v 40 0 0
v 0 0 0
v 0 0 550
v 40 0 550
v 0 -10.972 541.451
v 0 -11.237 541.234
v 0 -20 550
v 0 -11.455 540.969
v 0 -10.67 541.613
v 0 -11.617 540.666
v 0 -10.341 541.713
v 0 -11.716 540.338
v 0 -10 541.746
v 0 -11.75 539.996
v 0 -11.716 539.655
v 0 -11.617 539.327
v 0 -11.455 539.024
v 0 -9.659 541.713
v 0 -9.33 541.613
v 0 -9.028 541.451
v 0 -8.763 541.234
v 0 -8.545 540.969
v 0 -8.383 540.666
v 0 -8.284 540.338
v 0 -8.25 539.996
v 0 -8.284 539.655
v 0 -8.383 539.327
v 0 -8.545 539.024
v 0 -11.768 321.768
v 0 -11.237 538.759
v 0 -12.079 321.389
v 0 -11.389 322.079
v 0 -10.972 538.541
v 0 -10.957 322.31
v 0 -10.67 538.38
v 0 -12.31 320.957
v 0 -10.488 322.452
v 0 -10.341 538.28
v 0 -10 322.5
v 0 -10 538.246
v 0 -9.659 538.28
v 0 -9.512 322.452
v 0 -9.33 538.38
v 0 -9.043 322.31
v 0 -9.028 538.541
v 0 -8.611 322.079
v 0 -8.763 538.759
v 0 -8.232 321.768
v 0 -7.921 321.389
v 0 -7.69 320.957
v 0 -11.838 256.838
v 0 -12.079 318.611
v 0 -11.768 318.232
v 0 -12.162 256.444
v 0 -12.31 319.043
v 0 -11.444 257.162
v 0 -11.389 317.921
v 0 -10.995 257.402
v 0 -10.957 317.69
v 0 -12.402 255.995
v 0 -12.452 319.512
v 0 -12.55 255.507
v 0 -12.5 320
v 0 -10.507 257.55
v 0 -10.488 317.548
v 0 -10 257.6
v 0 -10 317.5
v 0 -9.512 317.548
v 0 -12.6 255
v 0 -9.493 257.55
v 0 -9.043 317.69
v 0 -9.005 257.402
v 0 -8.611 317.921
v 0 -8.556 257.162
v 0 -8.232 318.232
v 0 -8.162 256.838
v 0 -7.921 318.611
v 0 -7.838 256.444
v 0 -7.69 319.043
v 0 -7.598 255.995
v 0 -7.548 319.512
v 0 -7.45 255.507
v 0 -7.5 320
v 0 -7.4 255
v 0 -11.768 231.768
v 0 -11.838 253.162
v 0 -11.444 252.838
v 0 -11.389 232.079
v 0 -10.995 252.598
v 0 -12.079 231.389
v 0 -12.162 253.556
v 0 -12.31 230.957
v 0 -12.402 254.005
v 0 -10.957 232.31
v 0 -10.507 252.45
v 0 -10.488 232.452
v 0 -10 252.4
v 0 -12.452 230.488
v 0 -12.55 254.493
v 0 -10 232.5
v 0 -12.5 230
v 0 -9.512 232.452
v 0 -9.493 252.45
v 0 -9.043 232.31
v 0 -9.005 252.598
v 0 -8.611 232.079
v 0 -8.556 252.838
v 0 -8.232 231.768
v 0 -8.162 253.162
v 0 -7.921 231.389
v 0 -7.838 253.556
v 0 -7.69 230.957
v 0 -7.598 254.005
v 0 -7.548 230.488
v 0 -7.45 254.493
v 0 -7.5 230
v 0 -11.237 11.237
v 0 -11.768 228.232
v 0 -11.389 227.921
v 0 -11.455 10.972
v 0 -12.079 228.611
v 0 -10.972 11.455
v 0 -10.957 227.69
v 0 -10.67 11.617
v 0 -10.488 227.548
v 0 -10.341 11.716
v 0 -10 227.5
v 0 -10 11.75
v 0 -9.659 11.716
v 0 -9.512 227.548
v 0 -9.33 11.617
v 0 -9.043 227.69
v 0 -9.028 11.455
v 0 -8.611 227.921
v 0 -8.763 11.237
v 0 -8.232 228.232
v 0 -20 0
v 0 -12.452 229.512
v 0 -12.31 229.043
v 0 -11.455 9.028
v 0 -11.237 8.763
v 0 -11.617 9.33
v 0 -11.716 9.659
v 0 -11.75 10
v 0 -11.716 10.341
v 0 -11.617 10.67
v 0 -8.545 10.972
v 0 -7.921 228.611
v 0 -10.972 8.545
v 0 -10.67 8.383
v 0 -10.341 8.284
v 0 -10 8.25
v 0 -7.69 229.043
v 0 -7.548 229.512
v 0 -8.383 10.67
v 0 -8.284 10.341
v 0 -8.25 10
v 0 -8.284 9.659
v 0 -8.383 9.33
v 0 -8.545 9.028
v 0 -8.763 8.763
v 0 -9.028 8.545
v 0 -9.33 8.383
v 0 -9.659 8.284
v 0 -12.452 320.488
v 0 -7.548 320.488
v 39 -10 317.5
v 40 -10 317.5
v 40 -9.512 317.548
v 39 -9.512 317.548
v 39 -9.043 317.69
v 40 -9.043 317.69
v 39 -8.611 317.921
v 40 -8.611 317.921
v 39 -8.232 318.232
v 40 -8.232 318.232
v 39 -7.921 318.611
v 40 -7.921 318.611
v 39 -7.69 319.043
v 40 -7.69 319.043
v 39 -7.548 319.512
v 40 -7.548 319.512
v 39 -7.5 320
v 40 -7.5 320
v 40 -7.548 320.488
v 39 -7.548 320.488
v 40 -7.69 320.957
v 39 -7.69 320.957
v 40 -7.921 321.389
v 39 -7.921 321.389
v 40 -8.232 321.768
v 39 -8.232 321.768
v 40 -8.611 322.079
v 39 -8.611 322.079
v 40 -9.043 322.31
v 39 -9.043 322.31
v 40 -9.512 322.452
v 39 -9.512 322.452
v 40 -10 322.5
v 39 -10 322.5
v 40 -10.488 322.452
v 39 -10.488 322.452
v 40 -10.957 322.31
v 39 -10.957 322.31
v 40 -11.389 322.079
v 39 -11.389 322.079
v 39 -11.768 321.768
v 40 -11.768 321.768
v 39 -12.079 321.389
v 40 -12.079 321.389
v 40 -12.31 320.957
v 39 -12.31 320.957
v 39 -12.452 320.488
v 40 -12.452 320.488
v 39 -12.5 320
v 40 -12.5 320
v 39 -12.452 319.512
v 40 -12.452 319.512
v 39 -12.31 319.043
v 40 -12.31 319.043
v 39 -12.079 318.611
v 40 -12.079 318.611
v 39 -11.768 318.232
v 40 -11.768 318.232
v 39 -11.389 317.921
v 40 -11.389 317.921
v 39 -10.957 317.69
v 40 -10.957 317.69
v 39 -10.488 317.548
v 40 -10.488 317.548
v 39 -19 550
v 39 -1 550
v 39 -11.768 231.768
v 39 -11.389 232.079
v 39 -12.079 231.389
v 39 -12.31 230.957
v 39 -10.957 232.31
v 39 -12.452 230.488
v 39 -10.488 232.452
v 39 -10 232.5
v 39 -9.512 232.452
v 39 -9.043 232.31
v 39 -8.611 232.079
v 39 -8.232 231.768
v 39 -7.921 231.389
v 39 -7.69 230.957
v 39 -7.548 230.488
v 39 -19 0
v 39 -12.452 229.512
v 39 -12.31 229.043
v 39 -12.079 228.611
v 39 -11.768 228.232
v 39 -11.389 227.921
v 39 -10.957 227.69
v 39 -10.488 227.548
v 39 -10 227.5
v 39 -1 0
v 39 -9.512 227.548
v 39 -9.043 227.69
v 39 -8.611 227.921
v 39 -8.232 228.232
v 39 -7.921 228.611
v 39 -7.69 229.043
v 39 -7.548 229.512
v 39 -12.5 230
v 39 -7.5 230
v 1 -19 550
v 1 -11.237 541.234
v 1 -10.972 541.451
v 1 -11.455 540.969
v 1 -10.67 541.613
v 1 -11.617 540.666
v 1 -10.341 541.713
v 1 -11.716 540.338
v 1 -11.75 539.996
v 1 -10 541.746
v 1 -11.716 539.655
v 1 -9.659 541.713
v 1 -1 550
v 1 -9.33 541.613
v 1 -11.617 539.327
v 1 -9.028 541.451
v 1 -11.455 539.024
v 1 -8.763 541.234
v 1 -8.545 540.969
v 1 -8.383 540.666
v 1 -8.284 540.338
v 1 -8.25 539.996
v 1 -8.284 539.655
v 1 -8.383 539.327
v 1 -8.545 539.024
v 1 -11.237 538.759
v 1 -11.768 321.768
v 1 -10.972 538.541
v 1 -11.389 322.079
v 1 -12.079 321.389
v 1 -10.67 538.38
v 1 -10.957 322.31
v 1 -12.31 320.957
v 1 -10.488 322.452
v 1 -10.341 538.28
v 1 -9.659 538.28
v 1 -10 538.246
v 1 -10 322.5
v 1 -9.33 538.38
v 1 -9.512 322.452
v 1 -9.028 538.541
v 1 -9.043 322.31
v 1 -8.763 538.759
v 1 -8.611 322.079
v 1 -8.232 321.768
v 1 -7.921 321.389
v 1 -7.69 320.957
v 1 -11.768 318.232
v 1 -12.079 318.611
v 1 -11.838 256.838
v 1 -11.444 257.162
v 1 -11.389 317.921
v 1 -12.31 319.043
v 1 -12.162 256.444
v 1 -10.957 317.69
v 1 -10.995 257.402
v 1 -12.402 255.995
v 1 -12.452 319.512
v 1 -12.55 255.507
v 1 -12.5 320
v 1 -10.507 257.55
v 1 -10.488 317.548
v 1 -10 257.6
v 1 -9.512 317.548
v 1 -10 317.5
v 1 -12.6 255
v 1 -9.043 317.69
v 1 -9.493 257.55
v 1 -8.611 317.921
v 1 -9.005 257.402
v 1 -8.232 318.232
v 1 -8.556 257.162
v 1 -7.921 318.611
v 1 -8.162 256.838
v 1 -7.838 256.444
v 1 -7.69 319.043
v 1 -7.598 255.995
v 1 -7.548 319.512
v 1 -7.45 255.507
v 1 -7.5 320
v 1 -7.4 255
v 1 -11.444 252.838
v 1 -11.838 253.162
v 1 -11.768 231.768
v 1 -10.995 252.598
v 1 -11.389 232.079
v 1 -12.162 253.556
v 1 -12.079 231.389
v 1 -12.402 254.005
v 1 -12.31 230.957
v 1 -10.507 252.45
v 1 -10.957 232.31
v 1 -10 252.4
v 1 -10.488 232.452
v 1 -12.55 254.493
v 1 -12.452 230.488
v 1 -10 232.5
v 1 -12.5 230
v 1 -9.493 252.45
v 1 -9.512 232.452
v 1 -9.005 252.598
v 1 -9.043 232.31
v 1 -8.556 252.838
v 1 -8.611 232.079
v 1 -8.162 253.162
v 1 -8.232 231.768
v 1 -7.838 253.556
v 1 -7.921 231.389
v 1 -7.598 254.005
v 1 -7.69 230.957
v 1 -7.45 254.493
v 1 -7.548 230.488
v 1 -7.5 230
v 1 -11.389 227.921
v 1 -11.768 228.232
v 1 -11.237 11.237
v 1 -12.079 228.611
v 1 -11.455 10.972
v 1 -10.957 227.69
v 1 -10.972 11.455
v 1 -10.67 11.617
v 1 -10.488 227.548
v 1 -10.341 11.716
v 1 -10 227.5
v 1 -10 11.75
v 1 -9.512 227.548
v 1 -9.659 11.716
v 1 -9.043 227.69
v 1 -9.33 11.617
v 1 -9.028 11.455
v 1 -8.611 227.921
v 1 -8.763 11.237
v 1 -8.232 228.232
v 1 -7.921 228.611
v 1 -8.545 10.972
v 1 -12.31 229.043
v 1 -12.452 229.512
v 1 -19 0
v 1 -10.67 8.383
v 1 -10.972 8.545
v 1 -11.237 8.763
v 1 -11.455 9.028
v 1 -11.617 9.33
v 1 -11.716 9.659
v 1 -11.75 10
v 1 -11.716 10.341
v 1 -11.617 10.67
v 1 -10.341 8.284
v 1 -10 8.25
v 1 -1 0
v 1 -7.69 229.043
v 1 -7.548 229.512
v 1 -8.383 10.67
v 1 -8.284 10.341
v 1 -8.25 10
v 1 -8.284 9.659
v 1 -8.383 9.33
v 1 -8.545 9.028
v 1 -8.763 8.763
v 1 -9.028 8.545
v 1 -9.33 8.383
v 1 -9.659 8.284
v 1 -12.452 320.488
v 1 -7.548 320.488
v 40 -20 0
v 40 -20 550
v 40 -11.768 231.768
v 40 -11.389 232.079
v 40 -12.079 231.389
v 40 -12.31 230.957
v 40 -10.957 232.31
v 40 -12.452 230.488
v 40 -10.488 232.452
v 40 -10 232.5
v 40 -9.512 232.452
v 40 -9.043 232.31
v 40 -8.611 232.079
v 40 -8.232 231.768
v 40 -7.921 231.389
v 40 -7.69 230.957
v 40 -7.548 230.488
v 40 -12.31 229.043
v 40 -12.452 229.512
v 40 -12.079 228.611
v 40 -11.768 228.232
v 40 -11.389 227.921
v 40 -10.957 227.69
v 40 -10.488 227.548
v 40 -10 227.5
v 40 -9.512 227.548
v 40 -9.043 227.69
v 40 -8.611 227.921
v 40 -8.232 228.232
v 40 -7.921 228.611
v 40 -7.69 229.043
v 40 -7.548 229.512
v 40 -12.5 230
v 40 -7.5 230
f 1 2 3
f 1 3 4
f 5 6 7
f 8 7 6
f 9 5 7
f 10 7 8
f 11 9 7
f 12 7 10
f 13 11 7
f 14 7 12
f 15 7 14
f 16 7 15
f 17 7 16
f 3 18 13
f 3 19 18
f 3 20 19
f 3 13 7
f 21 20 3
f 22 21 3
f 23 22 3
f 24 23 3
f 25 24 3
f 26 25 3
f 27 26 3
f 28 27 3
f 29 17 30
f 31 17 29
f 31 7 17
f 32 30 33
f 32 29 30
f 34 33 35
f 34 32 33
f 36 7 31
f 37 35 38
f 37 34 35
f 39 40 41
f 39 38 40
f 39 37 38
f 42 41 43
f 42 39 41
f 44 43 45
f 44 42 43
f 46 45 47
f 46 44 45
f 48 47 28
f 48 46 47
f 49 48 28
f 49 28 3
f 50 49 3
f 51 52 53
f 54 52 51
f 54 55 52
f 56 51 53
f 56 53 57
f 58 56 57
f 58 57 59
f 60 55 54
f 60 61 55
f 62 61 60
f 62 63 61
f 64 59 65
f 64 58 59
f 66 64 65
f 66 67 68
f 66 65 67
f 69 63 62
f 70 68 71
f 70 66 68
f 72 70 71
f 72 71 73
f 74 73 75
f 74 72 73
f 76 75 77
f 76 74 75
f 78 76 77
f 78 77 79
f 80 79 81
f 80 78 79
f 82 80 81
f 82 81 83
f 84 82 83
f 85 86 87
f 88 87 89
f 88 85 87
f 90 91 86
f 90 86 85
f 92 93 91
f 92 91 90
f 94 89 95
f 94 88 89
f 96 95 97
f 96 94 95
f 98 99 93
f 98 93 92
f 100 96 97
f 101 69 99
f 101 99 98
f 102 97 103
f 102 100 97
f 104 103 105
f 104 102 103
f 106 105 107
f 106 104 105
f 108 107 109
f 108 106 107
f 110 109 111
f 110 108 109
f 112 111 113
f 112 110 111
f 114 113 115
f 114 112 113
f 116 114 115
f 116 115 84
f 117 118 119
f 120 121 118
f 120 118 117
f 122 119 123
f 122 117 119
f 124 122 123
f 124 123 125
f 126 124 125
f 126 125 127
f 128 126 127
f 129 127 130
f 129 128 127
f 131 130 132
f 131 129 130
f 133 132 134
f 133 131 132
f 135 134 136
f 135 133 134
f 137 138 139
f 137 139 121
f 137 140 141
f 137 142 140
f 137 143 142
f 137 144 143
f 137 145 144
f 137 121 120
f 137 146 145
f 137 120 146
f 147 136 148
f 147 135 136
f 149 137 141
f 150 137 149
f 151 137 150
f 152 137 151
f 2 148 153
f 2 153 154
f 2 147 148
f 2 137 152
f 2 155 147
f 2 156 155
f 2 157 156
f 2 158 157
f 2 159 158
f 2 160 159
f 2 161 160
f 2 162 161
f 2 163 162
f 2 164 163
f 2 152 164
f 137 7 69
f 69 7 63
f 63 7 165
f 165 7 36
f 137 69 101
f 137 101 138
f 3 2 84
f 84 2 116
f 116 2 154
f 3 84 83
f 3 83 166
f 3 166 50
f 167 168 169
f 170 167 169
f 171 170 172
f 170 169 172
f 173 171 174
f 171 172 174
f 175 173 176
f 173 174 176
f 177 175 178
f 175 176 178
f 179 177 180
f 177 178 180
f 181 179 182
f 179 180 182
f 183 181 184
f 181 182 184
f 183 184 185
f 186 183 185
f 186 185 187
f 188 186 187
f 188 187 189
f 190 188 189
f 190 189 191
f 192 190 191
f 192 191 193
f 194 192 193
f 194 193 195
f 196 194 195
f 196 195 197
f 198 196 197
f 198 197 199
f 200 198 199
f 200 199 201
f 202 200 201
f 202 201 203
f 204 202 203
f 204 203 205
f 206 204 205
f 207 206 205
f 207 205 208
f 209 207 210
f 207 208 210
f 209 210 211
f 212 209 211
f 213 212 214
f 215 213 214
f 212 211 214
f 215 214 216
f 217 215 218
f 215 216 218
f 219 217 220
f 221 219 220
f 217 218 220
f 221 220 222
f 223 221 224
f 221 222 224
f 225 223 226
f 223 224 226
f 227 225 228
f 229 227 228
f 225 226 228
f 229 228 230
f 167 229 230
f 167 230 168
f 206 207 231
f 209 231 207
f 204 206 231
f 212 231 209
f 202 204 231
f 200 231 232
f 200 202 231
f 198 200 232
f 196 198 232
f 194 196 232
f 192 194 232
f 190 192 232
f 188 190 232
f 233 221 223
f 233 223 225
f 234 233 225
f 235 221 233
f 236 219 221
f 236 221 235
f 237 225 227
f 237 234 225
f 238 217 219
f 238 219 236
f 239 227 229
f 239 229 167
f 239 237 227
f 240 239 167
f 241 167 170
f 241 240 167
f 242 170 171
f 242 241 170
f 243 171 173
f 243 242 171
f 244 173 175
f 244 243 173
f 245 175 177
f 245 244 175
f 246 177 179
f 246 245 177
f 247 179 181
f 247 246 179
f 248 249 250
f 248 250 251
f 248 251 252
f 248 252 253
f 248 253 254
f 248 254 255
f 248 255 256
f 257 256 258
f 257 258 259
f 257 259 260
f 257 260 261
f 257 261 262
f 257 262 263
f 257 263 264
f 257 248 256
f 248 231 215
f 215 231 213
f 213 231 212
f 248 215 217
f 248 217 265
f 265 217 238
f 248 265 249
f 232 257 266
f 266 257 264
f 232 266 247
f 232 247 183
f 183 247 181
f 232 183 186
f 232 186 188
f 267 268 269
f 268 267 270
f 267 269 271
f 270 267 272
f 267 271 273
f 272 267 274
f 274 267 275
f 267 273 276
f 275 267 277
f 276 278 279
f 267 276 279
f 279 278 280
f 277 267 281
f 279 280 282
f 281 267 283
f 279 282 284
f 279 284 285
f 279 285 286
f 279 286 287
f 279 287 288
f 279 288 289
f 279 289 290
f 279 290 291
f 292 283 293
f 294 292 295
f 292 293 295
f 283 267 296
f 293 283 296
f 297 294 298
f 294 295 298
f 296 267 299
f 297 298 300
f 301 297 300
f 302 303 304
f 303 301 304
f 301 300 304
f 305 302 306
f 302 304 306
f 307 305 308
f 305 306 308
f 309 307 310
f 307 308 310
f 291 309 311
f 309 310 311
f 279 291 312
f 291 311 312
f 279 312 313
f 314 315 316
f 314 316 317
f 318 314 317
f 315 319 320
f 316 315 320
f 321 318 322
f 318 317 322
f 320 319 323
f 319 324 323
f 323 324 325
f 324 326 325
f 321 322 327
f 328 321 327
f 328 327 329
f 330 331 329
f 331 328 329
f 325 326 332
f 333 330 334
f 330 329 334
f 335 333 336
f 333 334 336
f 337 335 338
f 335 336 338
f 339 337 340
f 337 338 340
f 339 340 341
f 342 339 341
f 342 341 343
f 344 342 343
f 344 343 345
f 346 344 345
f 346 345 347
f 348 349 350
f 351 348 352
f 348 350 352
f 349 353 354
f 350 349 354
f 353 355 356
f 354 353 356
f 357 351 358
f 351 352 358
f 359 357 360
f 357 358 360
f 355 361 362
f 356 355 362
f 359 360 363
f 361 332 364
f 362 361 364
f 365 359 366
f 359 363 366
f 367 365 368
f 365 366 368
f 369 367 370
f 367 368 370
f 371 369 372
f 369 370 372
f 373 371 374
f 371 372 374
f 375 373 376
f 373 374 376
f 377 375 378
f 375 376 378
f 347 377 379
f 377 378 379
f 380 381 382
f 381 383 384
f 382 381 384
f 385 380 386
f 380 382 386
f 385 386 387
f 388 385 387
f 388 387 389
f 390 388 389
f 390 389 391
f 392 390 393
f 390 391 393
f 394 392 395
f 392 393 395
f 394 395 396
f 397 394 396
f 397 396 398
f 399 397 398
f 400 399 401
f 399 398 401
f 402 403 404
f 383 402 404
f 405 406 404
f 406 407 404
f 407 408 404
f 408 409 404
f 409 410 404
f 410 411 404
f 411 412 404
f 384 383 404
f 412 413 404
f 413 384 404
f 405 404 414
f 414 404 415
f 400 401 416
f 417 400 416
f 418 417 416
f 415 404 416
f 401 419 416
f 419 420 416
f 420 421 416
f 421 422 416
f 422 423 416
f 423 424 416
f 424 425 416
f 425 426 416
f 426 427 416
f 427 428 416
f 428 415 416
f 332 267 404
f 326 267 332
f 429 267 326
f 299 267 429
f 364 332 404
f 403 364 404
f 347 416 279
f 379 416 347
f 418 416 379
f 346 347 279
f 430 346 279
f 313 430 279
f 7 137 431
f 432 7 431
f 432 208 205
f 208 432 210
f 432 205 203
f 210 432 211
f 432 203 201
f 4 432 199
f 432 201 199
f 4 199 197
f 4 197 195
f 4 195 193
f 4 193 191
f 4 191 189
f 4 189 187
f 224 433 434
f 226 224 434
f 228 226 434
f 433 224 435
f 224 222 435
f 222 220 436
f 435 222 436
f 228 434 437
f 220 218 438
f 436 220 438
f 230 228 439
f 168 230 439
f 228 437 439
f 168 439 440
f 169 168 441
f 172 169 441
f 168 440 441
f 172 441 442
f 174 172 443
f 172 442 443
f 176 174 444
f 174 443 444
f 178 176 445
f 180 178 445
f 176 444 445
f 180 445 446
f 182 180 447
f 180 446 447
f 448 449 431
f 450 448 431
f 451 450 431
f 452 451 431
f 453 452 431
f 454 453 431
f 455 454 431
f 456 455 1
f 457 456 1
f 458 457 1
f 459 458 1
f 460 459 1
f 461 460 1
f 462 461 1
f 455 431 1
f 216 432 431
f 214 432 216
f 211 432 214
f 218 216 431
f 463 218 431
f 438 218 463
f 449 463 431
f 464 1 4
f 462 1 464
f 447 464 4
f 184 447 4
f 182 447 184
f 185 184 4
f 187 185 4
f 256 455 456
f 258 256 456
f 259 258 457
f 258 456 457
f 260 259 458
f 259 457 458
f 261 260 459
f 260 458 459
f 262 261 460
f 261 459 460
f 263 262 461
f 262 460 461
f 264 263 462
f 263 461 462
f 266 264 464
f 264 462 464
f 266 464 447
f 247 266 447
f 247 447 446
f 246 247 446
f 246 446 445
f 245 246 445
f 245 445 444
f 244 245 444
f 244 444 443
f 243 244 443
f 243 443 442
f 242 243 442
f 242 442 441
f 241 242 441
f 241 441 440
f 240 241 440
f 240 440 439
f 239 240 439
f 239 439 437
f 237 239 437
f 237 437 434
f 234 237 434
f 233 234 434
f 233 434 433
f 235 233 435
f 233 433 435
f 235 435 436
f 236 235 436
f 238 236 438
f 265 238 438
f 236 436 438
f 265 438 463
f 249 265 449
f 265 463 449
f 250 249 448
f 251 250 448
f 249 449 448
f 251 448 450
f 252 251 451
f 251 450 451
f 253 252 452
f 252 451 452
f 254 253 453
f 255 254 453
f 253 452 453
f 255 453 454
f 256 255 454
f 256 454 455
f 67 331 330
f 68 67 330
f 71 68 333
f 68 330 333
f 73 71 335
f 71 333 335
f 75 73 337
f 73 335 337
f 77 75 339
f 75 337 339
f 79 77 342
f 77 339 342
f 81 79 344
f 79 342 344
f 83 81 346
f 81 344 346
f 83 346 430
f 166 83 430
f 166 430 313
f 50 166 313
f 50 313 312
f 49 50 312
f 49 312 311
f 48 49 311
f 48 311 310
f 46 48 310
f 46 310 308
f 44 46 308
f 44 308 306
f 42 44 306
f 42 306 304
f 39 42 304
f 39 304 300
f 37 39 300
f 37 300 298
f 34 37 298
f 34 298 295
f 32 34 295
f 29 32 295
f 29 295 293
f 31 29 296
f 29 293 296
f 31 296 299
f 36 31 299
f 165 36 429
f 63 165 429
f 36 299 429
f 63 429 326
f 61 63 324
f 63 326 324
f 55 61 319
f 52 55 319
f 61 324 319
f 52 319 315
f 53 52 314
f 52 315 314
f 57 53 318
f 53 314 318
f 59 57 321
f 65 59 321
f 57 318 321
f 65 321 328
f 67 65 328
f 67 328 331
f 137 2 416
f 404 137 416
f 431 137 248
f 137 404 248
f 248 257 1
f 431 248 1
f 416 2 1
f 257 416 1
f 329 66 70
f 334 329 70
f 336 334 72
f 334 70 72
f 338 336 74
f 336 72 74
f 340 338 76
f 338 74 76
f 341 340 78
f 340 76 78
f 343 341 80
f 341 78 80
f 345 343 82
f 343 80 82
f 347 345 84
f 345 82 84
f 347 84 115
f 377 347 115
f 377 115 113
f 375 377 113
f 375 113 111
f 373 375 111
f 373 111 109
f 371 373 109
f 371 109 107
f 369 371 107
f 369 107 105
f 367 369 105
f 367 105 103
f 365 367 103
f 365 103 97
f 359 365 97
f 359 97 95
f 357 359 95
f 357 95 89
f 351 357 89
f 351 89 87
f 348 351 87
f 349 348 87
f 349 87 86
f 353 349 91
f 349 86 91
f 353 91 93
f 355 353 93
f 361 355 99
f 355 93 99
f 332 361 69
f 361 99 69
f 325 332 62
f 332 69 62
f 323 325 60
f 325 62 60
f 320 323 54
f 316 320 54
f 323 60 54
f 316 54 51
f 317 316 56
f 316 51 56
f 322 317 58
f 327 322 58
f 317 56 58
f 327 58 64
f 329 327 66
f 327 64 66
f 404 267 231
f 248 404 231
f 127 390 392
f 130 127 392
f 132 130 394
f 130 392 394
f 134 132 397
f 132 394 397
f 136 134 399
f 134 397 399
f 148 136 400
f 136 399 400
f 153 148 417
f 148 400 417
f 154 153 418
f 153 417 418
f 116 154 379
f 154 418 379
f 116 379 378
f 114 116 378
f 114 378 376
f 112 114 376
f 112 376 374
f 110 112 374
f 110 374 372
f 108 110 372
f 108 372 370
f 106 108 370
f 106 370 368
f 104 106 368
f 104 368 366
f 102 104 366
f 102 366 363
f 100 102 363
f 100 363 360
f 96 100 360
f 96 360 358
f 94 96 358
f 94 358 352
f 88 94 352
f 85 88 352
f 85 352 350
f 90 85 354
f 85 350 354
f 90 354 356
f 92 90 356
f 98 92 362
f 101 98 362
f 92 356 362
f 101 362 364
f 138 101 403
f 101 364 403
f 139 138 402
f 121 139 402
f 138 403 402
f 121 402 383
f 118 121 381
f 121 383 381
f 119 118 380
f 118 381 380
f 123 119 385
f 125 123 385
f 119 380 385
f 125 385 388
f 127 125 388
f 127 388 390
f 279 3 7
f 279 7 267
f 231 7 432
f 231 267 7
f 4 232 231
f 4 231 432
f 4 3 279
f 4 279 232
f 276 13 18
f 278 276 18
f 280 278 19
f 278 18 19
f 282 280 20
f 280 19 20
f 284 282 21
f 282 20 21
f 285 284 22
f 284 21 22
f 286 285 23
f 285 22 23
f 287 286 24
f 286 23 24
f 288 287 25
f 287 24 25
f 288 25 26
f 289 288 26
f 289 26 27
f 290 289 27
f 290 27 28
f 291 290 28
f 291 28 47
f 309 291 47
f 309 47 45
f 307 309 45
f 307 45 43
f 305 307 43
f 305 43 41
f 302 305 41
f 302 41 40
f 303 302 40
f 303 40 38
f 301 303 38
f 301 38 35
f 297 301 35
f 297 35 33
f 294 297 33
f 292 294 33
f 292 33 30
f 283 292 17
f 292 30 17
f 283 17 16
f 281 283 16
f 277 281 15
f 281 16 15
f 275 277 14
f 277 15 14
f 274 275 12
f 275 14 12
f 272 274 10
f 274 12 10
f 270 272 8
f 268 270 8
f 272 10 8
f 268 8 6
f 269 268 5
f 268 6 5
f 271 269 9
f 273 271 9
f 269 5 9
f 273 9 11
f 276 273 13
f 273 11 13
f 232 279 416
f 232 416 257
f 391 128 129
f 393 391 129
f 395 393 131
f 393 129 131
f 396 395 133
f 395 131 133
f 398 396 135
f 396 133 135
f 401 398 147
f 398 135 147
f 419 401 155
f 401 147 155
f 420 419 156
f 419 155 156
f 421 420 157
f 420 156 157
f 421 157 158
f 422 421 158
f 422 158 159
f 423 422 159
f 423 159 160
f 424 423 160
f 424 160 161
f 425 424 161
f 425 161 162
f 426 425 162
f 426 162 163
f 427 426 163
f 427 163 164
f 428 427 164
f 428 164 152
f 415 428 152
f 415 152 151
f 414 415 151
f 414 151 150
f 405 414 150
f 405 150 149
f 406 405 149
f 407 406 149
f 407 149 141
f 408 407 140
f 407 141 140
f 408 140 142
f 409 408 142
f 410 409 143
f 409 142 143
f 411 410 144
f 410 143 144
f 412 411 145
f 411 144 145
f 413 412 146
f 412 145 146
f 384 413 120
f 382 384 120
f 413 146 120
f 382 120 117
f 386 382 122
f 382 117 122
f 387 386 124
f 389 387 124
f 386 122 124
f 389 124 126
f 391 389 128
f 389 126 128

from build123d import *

# Parameters (mm, degrees)
SKETCH_1_W          = 40
SKETCH_1_H          = 20
SKETCH_1_W_2        = 38
SKETCH_1_H_2        = 18
EXTRUDE_1_DEPTH     = 550
SKETCH_4_R          = 1.75
CUT_EXTRUDE_2_DEPTH = 1.5
SKETCH_5_R          = 2.6
CUT_EXTRUDE_3_DEPTH = 1.5
SKETCH_6_R          = 2.5
CUT_EXTRUDE_4_DEPTH = 552.815186453


with BuildPart() as part:
    # 草图1 → 拉伸-薄壁1 (new body)
    with BuildSketch(Plane.XY):
        with Locations((20, -10)):
            Rectangle(SKETCH_1_W, SKETCH_1_H)
        with Locations((20, -10)):
            Rectangle(SKETCH_1_W_2, SKETCH_1_H_2, mode=Mode.SUBTRACT)
    extrude(amount=EXTRUDE_1_DEPTH)

    # 草图4 → 切除-拉伸2 (cut)
    with BuildSketch(Plane.ZY):
        with Locations((539.996387591, -10)):
            Circle(SKETCH_4_R)
        with Locations((10, -10.000000002)):
            Circle(SKETCH_4_R)
    extrude(amount=-CUT_EXTRUDE_2_DEPTH, mode=Mode.SUBTRACT)

    # 草图5 → 切除-拉伸3 (cut)
    with BuildSketch(Plane.ZY):
        with Locations((255, -10)):
            Circle(SKETCH_5_R)
    extrude(amount=-CUT_EXTRUDE_3_DEPTH, mode=Mode.SUBTRACT)

    # 草图6 → 切除-拉伸4 (cut, through all)
    with BuildSketch(Plane(origin=(40, 0, 0), x_dir=(0, 0, -1), z_dir=(1, 0, 0))):
        with Locations((-320, -10)):
            Circle(SKETCH_6_R)
        with Locations((-230, -10)):
            Circle(SKETCH_6_R)
    extrude(amount=-CUT_EXTRUDE_4_DEPTH, mode=Mode.SUBTRACT)


solid = part.part
